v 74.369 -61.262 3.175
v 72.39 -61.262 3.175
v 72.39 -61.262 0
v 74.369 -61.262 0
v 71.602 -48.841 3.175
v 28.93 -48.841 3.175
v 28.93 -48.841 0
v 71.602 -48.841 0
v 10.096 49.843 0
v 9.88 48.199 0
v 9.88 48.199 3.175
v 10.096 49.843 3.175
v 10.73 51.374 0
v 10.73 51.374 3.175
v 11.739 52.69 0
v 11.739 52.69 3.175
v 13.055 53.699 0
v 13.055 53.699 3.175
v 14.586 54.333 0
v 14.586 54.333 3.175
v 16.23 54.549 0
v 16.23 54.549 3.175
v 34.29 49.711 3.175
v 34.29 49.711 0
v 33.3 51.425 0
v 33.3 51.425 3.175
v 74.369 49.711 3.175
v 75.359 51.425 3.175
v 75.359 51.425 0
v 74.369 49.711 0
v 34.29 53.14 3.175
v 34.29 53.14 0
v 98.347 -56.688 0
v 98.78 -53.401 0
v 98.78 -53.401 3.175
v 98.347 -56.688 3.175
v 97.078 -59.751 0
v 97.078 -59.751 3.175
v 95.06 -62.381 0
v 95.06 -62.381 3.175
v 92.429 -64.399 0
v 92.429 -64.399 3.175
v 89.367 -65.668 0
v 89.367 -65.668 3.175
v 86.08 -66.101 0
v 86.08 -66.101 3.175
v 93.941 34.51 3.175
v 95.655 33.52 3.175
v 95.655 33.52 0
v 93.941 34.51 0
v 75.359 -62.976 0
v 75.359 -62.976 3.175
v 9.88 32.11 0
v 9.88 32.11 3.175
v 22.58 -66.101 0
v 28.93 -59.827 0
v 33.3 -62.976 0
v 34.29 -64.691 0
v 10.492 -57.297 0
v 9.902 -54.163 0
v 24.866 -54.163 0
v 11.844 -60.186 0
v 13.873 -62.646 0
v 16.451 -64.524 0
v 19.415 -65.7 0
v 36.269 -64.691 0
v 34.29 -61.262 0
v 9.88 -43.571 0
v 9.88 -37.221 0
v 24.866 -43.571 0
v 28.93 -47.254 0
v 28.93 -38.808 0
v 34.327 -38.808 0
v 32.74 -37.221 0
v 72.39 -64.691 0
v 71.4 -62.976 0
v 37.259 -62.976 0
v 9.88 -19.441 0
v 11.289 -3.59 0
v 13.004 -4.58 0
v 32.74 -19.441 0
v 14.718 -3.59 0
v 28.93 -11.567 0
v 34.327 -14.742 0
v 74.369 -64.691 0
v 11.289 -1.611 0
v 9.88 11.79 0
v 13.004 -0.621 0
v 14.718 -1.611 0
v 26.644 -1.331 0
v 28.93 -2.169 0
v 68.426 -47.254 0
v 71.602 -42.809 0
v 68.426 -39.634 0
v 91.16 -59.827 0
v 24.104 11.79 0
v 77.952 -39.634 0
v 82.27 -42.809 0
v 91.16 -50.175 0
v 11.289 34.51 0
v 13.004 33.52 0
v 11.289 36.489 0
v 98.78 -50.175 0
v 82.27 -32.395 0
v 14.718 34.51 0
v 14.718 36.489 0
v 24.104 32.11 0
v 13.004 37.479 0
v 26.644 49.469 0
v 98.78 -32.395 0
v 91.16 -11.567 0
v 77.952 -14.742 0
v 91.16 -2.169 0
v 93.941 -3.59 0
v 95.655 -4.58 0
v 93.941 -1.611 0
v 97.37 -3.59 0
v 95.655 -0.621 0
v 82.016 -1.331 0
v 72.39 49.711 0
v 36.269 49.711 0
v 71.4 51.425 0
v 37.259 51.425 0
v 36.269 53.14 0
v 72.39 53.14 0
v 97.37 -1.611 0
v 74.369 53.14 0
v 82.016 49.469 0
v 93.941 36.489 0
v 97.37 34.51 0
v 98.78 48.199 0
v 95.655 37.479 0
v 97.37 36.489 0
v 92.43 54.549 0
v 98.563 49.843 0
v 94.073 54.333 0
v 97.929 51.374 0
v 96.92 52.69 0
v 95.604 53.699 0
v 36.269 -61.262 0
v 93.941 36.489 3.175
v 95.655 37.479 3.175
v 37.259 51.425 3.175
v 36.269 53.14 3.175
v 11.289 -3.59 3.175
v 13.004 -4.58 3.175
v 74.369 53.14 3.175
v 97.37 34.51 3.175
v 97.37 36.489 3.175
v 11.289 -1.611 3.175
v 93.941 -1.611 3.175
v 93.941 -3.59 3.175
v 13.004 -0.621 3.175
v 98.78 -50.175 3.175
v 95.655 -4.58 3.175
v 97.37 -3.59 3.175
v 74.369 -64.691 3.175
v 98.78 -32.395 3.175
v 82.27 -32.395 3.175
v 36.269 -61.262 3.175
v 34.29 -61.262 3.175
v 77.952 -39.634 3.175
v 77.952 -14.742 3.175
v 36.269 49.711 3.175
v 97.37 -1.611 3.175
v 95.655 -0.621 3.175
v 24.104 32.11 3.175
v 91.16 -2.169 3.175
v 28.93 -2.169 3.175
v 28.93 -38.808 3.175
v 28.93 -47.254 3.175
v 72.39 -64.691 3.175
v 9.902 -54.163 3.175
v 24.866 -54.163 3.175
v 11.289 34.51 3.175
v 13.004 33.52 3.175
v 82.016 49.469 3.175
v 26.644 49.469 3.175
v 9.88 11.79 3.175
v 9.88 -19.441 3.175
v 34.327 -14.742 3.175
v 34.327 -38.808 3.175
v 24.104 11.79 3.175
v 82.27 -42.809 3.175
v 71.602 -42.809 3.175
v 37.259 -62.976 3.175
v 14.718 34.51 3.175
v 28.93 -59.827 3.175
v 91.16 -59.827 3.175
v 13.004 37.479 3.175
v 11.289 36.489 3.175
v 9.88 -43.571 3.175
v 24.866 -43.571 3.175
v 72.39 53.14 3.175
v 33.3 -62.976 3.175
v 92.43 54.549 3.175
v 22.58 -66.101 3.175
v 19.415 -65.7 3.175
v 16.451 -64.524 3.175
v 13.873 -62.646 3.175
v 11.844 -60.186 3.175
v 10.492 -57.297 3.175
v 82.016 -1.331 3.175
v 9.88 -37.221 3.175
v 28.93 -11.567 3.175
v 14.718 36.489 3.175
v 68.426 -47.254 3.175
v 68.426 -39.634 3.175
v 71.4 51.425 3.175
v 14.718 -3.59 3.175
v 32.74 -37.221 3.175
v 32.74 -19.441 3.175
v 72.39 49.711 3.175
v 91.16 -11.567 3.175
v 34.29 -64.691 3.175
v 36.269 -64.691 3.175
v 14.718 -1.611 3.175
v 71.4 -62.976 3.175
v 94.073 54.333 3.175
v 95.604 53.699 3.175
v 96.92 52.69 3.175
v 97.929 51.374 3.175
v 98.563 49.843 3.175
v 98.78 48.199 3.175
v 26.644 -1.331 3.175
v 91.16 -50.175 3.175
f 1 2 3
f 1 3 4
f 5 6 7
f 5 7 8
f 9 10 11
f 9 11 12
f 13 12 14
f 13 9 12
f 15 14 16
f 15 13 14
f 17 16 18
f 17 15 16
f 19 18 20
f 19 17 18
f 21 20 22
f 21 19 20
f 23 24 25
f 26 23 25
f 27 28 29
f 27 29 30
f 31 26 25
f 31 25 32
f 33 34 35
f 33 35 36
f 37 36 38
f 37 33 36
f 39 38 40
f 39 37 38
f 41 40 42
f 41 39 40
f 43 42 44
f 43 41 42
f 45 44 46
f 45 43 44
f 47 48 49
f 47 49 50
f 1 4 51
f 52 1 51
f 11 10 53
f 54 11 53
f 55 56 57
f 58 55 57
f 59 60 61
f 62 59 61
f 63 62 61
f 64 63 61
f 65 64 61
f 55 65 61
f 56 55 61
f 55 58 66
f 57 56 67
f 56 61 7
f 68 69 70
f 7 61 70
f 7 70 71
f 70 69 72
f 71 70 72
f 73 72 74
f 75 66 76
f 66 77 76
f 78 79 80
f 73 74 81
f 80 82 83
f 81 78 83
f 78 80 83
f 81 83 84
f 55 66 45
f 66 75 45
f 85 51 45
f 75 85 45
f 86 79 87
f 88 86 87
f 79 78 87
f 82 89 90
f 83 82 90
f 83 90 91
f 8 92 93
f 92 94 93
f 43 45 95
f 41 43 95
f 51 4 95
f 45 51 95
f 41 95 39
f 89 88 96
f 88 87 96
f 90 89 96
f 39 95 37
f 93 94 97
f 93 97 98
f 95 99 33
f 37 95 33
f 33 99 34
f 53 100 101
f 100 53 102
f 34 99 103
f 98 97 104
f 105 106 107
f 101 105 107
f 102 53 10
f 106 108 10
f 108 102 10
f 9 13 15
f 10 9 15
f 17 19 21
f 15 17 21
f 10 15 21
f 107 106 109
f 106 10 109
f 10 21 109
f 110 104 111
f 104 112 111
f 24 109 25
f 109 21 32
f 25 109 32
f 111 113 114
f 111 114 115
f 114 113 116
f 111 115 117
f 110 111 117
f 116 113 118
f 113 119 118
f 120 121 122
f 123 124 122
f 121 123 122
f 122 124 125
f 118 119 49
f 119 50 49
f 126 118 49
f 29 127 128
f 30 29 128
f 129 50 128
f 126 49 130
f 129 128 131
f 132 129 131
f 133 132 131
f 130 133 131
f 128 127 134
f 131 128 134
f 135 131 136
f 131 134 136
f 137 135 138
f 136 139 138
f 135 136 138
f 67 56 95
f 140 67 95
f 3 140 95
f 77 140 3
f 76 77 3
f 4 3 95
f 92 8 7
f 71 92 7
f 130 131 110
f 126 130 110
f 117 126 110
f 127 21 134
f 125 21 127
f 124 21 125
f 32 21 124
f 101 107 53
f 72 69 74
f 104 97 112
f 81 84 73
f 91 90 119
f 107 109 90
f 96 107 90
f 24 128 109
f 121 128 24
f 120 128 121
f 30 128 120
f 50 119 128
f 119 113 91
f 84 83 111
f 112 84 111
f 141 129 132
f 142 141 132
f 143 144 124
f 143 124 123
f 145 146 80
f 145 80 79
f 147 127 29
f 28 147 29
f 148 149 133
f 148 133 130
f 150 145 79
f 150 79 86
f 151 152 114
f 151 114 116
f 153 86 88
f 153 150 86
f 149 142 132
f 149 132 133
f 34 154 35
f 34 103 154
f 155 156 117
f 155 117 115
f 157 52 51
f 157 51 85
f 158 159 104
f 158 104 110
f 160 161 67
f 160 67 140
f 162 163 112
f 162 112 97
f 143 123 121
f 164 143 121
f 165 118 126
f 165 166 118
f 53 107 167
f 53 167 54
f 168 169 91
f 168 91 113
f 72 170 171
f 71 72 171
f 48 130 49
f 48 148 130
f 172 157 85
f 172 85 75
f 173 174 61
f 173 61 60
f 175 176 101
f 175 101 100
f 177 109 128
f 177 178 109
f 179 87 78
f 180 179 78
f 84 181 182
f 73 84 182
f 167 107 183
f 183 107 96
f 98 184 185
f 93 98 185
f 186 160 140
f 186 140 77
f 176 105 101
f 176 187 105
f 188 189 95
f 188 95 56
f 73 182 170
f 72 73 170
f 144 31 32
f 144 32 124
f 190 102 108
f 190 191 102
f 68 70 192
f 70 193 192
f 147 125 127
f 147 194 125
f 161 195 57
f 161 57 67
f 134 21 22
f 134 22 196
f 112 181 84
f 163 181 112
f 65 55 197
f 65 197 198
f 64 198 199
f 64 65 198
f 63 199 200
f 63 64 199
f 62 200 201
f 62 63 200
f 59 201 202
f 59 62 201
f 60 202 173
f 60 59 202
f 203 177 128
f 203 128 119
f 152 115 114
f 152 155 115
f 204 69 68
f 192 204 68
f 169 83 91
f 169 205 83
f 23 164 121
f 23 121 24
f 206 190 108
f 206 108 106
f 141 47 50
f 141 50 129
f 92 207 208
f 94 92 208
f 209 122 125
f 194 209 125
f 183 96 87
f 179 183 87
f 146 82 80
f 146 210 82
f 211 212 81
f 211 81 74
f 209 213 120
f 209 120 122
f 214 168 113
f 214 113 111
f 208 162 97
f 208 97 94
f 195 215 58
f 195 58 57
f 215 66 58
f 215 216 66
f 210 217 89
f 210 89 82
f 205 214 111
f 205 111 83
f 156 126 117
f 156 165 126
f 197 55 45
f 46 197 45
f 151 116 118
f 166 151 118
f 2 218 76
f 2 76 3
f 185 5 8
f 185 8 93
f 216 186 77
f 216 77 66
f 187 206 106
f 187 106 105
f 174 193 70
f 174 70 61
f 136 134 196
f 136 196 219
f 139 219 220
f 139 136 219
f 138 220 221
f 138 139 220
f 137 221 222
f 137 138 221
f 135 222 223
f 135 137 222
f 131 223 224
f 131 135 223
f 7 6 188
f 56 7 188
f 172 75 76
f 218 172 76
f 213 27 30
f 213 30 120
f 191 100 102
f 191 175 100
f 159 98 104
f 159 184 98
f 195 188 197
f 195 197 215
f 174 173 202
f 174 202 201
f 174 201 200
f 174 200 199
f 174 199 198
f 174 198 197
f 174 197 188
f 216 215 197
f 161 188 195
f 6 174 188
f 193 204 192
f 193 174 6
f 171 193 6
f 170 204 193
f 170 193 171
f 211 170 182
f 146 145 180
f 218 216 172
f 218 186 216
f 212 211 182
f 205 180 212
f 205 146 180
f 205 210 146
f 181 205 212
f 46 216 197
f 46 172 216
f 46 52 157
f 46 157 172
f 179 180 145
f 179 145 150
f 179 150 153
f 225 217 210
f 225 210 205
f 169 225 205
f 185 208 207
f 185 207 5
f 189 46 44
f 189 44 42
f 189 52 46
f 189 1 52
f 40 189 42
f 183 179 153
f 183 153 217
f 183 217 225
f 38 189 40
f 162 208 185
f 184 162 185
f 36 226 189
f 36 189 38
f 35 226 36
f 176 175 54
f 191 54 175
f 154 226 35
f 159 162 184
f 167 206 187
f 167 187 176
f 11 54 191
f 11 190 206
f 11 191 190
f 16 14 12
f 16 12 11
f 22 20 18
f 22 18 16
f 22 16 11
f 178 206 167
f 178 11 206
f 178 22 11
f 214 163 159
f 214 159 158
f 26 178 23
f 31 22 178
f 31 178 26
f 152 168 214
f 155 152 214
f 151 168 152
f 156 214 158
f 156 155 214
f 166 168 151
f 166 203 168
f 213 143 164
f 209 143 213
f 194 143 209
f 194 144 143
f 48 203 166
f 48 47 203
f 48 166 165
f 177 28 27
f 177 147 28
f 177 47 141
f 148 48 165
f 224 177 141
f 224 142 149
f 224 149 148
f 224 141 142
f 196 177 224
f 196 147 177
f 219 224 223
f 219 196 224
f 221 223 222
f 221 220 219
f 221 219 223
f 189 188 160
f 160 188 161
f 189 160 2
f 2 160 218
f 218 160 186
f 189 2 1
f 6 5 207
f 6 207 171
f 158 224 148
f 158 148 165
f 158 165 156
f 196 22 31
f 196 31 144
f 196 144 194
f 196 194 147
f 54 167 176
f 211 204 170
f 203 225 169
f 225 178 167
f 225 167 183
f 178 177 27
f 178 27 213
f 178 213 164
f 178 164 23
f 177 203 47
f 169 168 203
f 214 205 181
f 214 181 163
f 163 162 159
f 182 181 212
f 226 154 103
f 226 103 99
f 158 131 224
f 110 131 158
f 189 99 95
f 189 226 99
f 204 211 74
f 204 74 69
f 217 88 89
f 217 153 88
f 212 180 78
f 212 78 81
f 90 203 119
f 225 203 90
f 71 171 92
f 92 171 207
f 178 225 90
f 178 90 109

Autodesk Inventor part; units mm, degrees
ref_plane "YZ Plane" through (0, 0, 0) normal (1, 0, 0) x (0, 1, 0)
ref_plane "XZ Plane" through (0, 0, 0) normal (0, 1, 0) x (-1, 0, 0)
ref_plane "XY Plane" through (0, 0, 0) normal (0, 0, 1) x (1, 0, 0)
sketch "Sketch1" plane through (0, 0, 0) normal (0, 0, 1) x (1, 0, 0)
  line L0 (9.8795, 48.1994) -> (9.8795, -53.4006)
  line L1 (16.2295, 54.5494) -> (92.4295, 54.5494)
  line L2 (98.7795, 48.1994) -> (98.7795, -53.4006)
  line L3 (22.5795, -66.1006) -> (86.0795, -66.1006)
  arc A0 (9.8795, -53.4006) -> (22.5795, -66.1006) centre (22.5795, -53.4006) ccw
  arc A1 (16.2295, 54.5494) -> (9.8795, 48.1994) centre (16.2295, 48.1994) ccw
  arc A2 (98.7795, 48.1994) -> (92.4295, 54.5494) centre (92.4295, 48.1994) ccw
  arc A3 (86.0795, -66.1006) -> (98.7795, -53.4006) centre (86.0795, -53.4006) ccw
  point P0 (0, 0)
  dimension "d0" = 12.7
  dimension "d1" = 6.35
  dimension "d2" = 120.65
  dimension "d3" = 88.9
extrude "Extrusion1" add sketch "Sketch1" along normal blind 3.175
sketch "Sketch2" plane through (0, 0, 3.175) normal (0, 0, 1) x (1, 0, 0)
  line L0 (9.8795, -53.4006) -> (9.8795, 48.1994) projected
  line L1 (98.7795, 48.1994) -> (98.7795, -53.4006) projected
  line L2 (16.2295, 54.5494) -> (92.4295, 54.5494) projected
  line L3 (26.6435, 49.4694) -> (82.0155, 49.4694)
  line L4 (82.0155, 49.4694) -> (82.0155, -1.3306)
  line L5 (82.0155, -1.3306) -> (26.6435, -1.3306)
  line L6 (26.6435, -1.3306) -> (26.6435, 49.4694)
  point P0 (0, 0)
  dimension "d13" = 16.764
  dimension "d14" = 16.764
  dimension "d15" = 5.08
  dimension "d16" = 55.88
extrude "Extrusion2" cut sketch "Sketch2" against normal through all
sketch "Sketch3" plane through (0, 0, 3.175) normal (0, 0, 1) x (1, 0, 0)
  line L0 (9.8795, -53.4006) -> (9.8795, 48.1994) projected
  line L1 (86.0795, -66.1006) -> (22.5795, -66.1006) projected
  line L2 (9.8795, -19.4408) -> (32.7395, -19.4408)
  line L3 (32.7395, -19.4408) -> (32.7395, -37.2208)
  line L4 (32.7395, -37.2208) -> (9.8795, -37.2208)
  point P0 (0, 0)
  dimension "d20" = 28.8798
  dimension "d21" = 46.6598
  dimension "d22" = 22.86
extrude "Extrusion3" cut sketch "Sketch3" against normal through all
sketch "Sketch4" plane through (0, 0, 3.175) normal (0, 0, 1) x (1, 0, 0)
  line L0 (9.8795, -53.4006) -> (9.8795, -37.2208) projected
  arc A0 (9.8795, -53.4006) -> (22.5795, -66.1006) centre (22.5795, -53.4006) ccw projected
  line L1 (86.0795, -66.1006) -> (22.5795, -66.1006) projected
  line L2 (24.8655, -43.5708) -> (24.8655, -54.1626)
  line L3 (24.8655, -43.5708) -> (9.8795, -43.5708)
  line L4 (24.8655, -54.1626) -> (9.9024, -54.1626)
  point P0 (0, 0)
  dimension "d26" = 22.5298
  dimension "d27" = 14.986
  dimension "d28" = 11.938
extrude "Extrusion4" cut sketch "Sketch4" against normal through all
sketch "Sketch5" plane through (0, 0, 3.175) normal (0, 0, 1) x (1, 0, 0)
  line L0 (86.0795, -66.1006) -> (22.5795, -66.1006) projected
  line L1 (9.8795, -19.4408) -> (9.8795, 48.1994) projected
  line L2 (9.8795, -43.5708) -> (9.8795, -37.2208) projected
  line L3 (28.9295, -2.1688) -> (91.1595, -2.1688)
  line L4 (91.1595, -2.1688) -> (91.1595, -11.5668)
  line L5 (91.1595, -11.5668) -> (28.9295, -11.5668)
  line L6 (28.9295, -11.5668) -> (28.9295, -2.1688)
  line L7 (28.9295, -50.4288) -> (91.1595, -50.4288)
  line L8 (91.1595, -50.4288) -> (91.1595, -59.8268)
  line L9 (91.1595, -59.8268) -> (28.9295, -59.8268)
  line L10 (28.9295, -59.8268) -> (28.9295, -50.4288)
  point P0 (0, 0)
  dimension "d31" = 54.5338
  dimension "d32" = 9.398
  dimension "d33" = 62.23
  dimension "d34" = 19.05
  dimension "d35" = 19.05
  dimension "d36" = 6.2738
extrude "Extrusion5" cut sketch "Sketch5" against normal through all
sketch "Sketch6" plane through (0, 0, 3.175) normal (0, 0, 1) x (1, 0, 0)
  line L0 (71.6015, -11.5668) -> (28.9295, -11.5668)
  line L1 (28.9295, -50.4288) -> (71.6015, -50.4288)
  line L2 (71.6015, -50.4288) -> (71.6015, -11.5668)
  line L3 (28.9295, -59.8268) -> (28.9295, -50.4288) projected
  line L4 (28.9295, -11.5668) -> (28.9295, -50.4288)
  line L5 (28.9295, -47.2538) -> (68.4265, -47.2538)
  line L6 (9.8795, -19.4408) -> (32.7395, -19.4408) projected
  line L7 (32.7395, -19.4408) -> (32.7395, -37.2208) projected
  line L8 (32.7395, -37.2208) -> (9.8795, -37.2208) projected
  line L9 (28.9295, -17.8533) -> (34.327, -17.8533)
  line L10 (34.327, -17.8533) -> (34.327, -38.8083)
  line L11 (34.327, -38.8083) -> (28.9295, -38.8083)
  line L12 (91.1595, -11.5668) -> (28.9295, -11.5668) projected
  line L13 (28.9295, -50.4288) -> (91.1595, -50.4288) projected
  line L14 (91.1595, -50.4288) -> (91.1595, -42.8088)
  line L15 (91.1595, -42.8088) -> (71.6015, -42.8088)
  line L16 (28.9295, -14.7418) -> (71.6015, -14.7418)
  line L17 (28.9295, -48.8413) -> (71.6015, -48.8413)
  line L18 (68.4265, -47.2538) -> (68.4265, -39.6338)
  line L19 (68.4265, -39.6338) -> (71.6015, -39.6338)
  line L20 (91.1595, -50.4288) -> (71.6015, -50.4288)
  line L21 (98.7795, 48.1994) -> (98.7795, -53.4006) projected
  line L22 (34.327, -17.8533) -> (34.327, -14.7418)
  point P0 (0, 0)
  dimension "d46" = 3.175
  dimension "d49" = 1.5875
  dimension "d50" = 1.5875
  dimension "d51" = 1.5875
  dimension "d54" = 7.62
  dimension "d55" = 3.175
  dimension "d57" = 1.5875
  dimension "d58" = 3.175
  dimension "d61" = 3.175
  dimension "d72" = 27.178
extrude "Extrusion11" cut sketch "Sketch6" against normal through all contours L2 L19 L18 L5 L4 L11 L10 L22 L16 | L15 L14 L13 L2 | L2 L1 L4 L17
sketch "Sketch7" plane through (0, 0, 3.175) normal (0, 0, 1) x (1, 0, 0)
  line L0 (71.6015, -14.7418) -> (71.6015, -39.6338) projected
  line L1 (71.6015, -14.7418) -> (77.9515, -14.7418)
  line L2 (77.9515, -14.7418) -> (77.9515, -39.6338)
  line L3 (77.9515, -39.6338) -> (71.6015, -39.6338)
  point P0 (0, 0)
  dimension "d64" = 6.35
extrude "Extrusion12" cut sketch "Sketch7" against normal through all
sketch "Sketch8" plane through (0, 0, 3.175) normal (0, 0, 1) x (1, 0, 0)
  line L0 (86.0795, -66.1006) -> (22.5795, -66.1006) projected
  line L1 (98.7795, 48.1994) -> (98.7795, -53.4006) projected
  line L2 (82.2695, -32.3948) -> (98.7795, -32.3948)
  line L3 (98.7795, -32.3948) -> (98.7795, -50.1748)
  line L4 (98.7795, -50.1748) -> (82.2695, -50.1748)
  line L5 (82.2695, -50.1748) -> (82.2695, -32.3948)
  point P0 (0, 0)
  dimension "d67" = 15.9258
  dimension "d68" = 17.78
  dimension "d69" = 16.51
extrude "Extrusion13" cut sketch "Sketch8" against normal through all
sketch "Sketch9" plane through (0, 0, 3.175) normal (0, 0, 1) x (1, 0, 0)
  line L0 (98.7795, 48.1994) -> (98.7795, -32.3948) projected
  line L1 (16.2295, 54.5494) -> (92.4295, 54.5494) projected
  line L2 (9.8795, -19.4408) -> (9.8795, 48.1994) projected
  line L3 (86.0795, -66.1006) -> (22.5795, -66.1006) projected
  line L4 (36.2694, 49.7107) -> (34.2897, 49.7107)
  line L5 (34.2897, 49.7107) -> (33.2998, 51.4252)
  line L6 (33.2998, 51.4252) -> (34.2897, 53.1397)
  line L7 (34.2897, 53.1397) -> (36.2694, 53.1397)
  line L8 (36.2694, 53.1397) -> (37.2593, 51.4252)
  line L9 (37.2593, 51.4252) -> (36.2694, 49.7107)
  line L10 (75.3593, 51.4252) -> (74.3694, 49.7107)
  line L11 (74.3694, 49.7107) -> (72.3897, 49.7107)
  line L12 (72.3897, 49.7107) -> (71.3998, 51.4252)
  line L13 (71.3998, 51.4252) -> (72.3897, 53.1397)
  line L14 (72.3897, 53.1397) -> (74.3694, 53.1397)
  line L15 (74.3694, 53.1397) -> (75.3593, 51.4252)
  line L16 (97.3698, 34.5095) -> (95.6553, 33.5197)
  line L17 (95.6553, 33.5197) -> (93.9408, 34.5095)
  line L18 (93.9408, 34.5095) -> (93.9408, 36.4893)
  line L19 (93.9408, 36.4893) -> (95.6553, 37.4791)
  line L20 (95.6553, 37.4791) -> (97.3698, 36.4893)
  line L21 (97.3698, 36.4893) -> (97.3698, 34.5095)
  line L22 (37.2593, -62.9764) -> (36.2694, -64.6909)
  line L23 (36.2694, -64.6909) -> (34.2897, -64.6909)
  line L24 (34.2897, -64.6909) -> (33.2998, -62.9764)
  line L25 (33.2998, -62.9764) -> (34.2897, -61.2619)
  line L26 (34.2897, -61.2619) -> (36.2694, -61.2619)
  line L27 (36.2694, -61.2619) -> (37.2593, -62.9764)
  line L28 (75.3593, -62.9764) -> (74.3694, -64.6909)
  line L29 (74.3694, -64.6909) -> (72.3897, -64.6909)
  line L30 (72.3897, -64.6909) -> (71.3998, -62.9764)
  line L31 (71.3998, -62.9764) -> (72.3897, -61.2619)
  line L32 (72.3897, -61.2619) -> (74.3694, -61.2619)
  line L33 (74.3694, -61.2619) -> (75.3593, -62.9764)
  line L34 (97.3698, -3.5905) -> (95.6553, -4.5803)
  line L35 (95.6553, -4.5803) -> (93.9408, -3.5905)
  line L36 (93.9408, -3.5905) -> (93.9408, -1.6107)
  line L37 (93.9408, -1.6107) -> (95.6553, -0.6209)
  line L38 (95.6553, -0.6209) -> (97.3698, -1.6107)
  line L39 (97.3698, -1.6107) -> (97.3698, -3.5905)
  line L40 (14.7182, 34.5095) -> (13.0037, 33.5197)
  line L41 (13.0037, 33.5197) -> (11.2892, 34.5095)
  line L42 (11.2892, 34.5095) -> (11.2892, 36.4893)
  line L43 (11.2892, 36.4893) -> (13.0037, 37.4791)
  line L44 (13.0037, 37.4791) -> (14.7182, 36.4893)
  line L45 (14.7182, 36.4893) -> (14.7182, 34.5095)
  line L46 (14.7182, -1.6107) -> (14.7182, -3.5905)
  line L47 (14.7182, -3.5905) -> (13.0037, -4.5803)
  line L48 (13.0037, -4.5803) -> (11.2892, -3.5905)
  line L49 (11.2892, -3.5905) -> (11.2892, -1.6107)
  line L50 (11.2892, -1.6107) -> (13.0037, -0.6209)
  line L51 (13.0037, -0.6209) -> (14.7182, -1.6107)
  point P0 (0, 0)
  point P1 (35.2795, 51.4252)
  point P2 (73.3795, 51.4252)
  point P3 (95.6553, 35.4994)
  point P4 (35.2795, -62.9764)
  point P5 (73.3795, -62.9764)
  point P6 (95.6553, -2.6006)
  point P7 (13.0037, 35.4994)
  point P8 (13.0037, -2.6006)
  dimension "d73" = 3.429
  dimension "d74" = 3.1242
  dimension "d75" = 3.1242
  dimension "d76" = 3.1242
  dimension "d77" = 3.1242
  dimension "d78" = 25.4
  dimension "d79" = 19.05
  dimension "d80" = 38.1
  dimension "d81" = 38.1
extrude "Extrusion14" cut sketch "Sketch9" against normal through all
sketch "Sketch10" plane through (0, 0, 0) normal (0, 0, -1) x (-1, 0, 0)
  line L0 (-11.2892, 36.4893) -> (-11.2892, 34.5095) projected
  line L1 (-9.8795, 48.1994) -> (-9.8795, -19.4408) projected
  line L2 (-26.6435, 49.4694) -> (-26.6435, -1.3306) projected
  line L3 (-24.1035, 32.11) -> (-24.1035, 11.79)
  line L4 (-24.1035, 32.11) -> (-9.8795, 32.11)
  line L5 (-24.1035, 11.79) -> (-9.8795, 11.79)
  point P0 (-13.0037, 33.5197)
  point P1 (0, 0)
  dimension "d84" = 2.54
  dimension "d86" = 1.4097
  dimension "d87" = 1.4097
  dimension "d88" = 20.32
extrude "Extrusion15" cut sketch "Sketch10" against normal through all
equation "\"d14\" = d13"
equation "\"d35\" = d34"
equation "\"d87\" = d86"
properties part number "beagle_spacer_top"
